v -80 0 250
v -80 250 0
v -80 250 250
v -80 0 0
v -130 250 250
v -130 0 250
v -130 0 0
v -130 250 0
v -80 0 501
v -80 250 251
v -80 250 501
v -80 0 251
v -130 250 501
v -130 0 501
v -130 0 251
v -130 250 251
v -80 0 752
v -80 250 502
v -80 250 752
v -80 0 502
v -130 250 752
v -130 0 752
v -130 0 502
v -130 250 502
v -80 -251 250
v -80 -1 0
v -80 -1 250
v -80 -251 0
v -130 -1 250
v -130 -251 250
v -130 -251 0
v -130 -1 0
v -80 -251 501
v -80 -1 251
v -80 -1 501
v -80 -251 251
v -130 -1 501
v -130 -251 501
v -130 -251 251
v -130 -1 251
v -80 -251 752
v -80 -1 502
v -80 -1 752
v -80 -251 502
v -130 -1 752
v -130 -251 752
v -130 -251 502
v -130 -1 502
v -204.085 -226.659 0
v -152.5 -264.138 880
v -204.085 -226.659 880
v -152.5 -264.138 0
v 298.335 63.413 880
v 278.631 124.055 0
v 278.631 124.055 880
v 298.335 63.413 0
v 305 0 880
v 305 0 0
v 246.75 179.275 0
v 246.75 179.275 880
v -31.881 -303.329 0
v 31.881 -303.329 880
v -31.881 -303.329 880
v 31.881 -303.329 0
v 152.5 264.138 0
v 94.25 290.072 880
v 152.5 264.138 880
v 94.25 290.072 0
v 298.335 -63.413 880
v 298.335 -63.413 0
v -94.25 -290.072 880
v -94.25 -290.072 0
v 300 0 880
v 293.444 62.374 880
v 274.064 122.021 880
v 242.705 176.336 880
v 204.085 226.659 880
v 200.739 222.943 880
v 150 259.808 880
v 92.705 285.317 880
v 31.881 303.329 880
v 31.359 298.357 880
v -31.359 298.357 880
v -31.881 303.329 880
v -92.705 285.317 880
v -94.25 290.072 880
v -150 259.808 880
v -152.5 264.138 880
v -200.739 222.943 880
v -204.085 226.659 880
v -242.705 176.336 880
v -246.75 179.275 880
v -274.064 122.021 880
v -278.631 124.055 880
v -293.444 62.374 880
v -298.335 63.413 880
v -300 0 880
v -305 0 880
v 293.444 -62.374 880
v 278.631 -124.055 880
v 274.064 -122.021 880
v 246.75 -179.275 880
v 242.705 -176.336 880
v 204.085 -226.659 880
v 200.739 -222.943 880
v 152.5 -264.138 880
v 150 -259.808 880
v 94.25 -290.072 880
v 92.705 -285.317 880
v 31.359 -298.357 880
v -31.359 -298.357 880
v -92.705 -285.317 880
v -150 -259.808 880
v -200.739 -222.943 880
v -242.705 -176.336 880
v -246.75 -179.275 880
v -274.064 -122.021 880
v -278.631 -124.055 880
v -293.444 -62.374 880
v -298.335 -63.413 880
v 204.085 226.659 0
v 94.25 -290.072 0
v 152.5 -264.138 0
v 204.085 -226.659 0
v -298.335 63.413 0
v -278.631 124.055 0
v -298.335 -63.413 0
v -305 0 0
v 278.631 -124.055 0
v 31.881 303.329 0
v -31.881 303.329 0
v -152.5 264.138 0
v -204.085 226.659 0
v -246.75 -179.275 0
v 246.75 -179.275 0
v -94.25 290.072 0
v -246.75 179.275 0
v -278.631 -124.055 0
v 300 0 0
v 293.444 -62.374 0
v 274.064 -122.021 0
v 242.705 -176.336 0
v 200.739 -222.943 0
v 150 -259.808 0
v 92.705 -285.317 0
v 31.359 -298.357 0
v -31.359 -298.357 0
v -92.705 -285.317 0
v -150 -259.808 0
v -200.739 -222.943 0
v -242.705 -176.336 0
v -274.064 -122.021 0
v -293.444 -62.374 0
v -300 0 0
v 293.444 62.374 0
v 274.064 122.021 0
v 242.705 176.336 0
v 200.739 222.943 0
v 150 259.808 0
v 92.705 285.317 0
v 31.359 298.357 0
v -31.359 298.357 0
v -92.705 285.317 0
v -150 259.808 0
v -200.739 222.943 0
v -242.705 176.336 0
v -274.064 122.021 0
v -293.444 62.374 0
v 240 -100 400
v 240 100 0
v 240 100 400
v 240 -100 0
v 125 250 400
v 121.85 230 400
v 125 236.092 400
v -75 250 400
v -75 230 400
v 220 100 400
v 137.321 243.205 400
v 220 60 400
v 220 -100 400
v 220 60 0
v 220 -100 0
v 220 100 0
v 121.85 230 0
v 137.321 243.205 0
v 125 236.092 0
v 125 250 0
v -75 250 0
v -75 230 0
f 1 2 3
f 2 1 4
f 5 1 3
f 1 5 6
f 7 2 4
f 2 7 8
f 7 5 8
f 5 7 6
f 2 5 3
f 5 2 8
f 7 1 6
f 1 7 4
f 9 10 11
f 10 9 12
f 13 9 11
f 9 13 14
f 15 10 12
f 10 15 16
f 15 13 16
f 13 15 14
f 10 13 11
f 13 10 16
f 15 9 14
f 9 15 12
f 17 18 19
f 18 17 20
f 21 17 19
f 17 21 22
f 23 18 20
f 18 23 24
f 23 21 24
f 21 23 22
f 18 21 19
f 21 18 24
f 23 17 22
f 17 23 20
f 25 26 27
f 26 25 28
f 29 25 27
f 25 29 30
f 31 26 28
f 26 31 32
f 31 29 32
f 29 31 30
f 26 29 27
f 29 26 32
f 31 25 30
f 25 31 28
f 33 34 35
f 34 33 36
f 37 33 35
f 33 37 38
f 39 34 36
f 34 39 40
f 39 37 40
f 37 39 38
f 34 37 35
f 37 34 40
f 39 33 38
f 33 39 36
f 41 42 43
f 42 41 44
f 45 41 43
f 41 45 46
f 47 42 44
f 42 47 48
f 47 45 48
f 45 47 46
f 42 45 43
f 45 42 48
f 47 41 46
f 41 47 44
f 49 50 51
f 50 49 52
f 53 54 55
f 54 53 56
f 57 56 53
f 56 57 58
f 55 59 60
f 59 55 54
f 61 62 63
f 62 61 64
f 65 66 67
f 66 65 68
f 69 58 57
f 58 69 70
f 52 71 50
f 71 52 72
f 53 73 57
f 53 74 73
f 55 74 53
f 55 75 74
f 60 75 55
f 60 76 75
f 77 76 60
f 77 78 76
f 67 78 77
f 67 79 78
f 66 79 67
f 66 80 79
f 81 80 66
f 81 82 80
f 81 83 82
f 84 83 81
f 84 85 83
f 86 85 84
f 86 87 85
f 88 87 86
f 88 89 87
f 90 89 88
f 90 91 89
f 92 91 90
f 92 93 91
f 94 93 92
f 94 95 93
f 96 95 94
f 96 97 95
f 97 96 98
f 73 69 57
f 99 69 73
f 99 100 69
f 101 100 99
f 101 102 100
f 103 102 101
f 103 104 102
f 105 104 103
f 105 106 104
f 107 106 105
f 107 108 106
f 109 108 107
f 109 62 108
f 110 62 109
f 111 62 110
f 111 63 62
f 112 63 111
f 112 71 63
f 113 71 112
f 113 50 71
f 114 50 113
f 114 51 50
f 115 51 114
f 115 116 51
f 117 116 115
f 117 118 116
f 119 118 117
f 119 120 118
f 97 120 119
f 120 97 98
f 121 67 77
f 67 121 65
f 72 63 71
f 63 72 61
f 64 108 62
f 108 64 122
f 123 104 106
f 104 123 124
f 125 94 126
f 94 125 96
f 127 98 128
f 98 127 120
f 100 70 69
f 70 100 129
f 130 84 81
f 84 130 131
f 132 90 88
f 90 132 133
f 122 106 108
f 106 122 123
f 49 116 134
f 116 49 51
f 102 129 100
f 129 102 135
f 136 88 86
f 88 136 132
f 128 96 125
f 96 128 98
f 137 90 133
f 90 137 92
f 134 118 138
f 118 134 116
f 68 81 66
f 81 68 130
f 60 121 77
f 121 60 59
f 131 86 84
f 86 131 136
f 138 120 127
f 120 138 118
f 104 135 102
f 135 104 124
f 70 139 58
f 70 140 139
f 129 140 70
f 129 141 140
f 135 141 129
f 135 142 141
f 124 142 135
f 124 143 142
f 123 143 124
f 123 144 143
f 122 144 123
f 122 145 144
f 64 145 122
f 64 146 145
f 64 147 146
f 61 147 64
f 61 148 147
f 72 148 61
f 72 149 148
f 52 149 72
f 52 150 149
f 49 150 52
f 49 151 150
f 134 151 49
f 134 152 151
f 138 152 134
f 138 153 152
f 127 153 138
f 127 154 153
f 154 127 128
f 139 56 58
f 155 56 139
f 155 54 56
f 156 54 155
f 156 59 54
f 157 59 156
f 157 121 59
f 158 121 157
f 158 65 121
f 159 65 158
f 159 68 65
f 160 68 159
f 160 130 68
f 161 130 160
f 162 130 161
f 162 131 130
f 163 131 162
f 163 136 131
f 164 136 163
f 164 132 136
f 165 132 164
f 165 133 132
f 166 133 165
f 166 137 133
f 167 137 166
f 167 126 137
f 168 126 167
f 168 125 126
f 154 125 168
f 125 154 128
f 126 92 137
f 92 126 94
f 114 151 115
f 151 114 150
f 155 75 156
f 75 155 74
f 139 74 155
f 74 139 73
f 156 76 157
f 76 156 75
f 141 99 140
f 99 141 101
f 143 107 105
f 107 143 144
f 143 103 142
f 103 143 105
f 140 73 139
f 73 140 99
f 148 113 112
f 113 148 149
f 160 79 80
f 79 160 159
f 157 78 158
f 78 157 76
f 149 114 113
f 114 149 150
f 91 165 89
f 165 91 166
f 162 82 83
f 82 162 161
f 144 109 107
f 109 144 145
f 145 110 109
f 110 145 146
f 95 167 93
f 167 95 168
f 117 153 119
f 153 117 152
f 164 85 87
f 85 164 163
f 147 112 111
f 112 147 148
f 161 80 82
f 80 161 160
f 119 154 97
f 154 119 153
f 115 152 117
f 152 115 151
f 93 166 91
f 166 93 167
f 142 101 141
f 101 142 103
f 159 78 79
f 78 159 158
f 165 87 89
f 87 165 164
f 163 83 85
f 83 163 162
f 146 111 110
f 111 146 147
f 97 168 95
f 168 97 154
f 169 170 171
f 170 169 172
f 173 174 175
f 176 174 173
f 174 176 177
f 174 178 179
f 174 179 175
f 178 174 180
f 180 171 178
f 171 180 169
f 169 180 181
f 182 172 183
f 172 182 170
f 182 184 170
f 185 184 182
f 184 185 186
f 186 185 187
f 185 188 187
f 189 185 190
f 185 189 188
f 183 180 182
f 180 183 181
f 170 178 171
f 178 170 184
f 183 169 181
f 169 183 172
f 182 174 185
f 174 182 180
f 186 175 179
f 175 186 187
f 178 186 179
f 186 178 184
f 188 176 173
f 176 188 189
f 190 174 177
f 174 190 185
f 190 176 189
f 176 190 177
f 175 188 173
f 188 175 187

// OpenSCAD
laatanpaksuus = 20;
laatanleveys = 200;
arinanpaksuus = 50;
union() {
  translate([220, -100, 0])
     cube([20, 200, 400]);

 translate([arinanpaksuus + laatanleveys -130 + laatanleveys - 100, 60, 0])
   rotate([0, 0, 30])
     cube([20, 200, 400]);

 translate([arinanpaksuus + laatanleveys -130 + 5, 250-laatanpaksuus, 0])
   rotate([0, 0, 90])
     cube([20, 200, 400]);
 translate([-130,0, 0]) {
 cube([50,250,250]);
 translate([0,0,251]) cube([50,250,250]);
 translate([0,0,502]) cube([50,250,250]);

 translate([0,-251,0])cube([50,250,250]);
 translate([0,-251,251]) cube([50,250,250]);
 translate([0,-251,502]) cube([50,250,250]);
 }

difference(){
 cylinder(880, 610/2, 610/2);
translate([0,0,-1]) cylinder(882, 600/2, 600/2);
}

    
}
